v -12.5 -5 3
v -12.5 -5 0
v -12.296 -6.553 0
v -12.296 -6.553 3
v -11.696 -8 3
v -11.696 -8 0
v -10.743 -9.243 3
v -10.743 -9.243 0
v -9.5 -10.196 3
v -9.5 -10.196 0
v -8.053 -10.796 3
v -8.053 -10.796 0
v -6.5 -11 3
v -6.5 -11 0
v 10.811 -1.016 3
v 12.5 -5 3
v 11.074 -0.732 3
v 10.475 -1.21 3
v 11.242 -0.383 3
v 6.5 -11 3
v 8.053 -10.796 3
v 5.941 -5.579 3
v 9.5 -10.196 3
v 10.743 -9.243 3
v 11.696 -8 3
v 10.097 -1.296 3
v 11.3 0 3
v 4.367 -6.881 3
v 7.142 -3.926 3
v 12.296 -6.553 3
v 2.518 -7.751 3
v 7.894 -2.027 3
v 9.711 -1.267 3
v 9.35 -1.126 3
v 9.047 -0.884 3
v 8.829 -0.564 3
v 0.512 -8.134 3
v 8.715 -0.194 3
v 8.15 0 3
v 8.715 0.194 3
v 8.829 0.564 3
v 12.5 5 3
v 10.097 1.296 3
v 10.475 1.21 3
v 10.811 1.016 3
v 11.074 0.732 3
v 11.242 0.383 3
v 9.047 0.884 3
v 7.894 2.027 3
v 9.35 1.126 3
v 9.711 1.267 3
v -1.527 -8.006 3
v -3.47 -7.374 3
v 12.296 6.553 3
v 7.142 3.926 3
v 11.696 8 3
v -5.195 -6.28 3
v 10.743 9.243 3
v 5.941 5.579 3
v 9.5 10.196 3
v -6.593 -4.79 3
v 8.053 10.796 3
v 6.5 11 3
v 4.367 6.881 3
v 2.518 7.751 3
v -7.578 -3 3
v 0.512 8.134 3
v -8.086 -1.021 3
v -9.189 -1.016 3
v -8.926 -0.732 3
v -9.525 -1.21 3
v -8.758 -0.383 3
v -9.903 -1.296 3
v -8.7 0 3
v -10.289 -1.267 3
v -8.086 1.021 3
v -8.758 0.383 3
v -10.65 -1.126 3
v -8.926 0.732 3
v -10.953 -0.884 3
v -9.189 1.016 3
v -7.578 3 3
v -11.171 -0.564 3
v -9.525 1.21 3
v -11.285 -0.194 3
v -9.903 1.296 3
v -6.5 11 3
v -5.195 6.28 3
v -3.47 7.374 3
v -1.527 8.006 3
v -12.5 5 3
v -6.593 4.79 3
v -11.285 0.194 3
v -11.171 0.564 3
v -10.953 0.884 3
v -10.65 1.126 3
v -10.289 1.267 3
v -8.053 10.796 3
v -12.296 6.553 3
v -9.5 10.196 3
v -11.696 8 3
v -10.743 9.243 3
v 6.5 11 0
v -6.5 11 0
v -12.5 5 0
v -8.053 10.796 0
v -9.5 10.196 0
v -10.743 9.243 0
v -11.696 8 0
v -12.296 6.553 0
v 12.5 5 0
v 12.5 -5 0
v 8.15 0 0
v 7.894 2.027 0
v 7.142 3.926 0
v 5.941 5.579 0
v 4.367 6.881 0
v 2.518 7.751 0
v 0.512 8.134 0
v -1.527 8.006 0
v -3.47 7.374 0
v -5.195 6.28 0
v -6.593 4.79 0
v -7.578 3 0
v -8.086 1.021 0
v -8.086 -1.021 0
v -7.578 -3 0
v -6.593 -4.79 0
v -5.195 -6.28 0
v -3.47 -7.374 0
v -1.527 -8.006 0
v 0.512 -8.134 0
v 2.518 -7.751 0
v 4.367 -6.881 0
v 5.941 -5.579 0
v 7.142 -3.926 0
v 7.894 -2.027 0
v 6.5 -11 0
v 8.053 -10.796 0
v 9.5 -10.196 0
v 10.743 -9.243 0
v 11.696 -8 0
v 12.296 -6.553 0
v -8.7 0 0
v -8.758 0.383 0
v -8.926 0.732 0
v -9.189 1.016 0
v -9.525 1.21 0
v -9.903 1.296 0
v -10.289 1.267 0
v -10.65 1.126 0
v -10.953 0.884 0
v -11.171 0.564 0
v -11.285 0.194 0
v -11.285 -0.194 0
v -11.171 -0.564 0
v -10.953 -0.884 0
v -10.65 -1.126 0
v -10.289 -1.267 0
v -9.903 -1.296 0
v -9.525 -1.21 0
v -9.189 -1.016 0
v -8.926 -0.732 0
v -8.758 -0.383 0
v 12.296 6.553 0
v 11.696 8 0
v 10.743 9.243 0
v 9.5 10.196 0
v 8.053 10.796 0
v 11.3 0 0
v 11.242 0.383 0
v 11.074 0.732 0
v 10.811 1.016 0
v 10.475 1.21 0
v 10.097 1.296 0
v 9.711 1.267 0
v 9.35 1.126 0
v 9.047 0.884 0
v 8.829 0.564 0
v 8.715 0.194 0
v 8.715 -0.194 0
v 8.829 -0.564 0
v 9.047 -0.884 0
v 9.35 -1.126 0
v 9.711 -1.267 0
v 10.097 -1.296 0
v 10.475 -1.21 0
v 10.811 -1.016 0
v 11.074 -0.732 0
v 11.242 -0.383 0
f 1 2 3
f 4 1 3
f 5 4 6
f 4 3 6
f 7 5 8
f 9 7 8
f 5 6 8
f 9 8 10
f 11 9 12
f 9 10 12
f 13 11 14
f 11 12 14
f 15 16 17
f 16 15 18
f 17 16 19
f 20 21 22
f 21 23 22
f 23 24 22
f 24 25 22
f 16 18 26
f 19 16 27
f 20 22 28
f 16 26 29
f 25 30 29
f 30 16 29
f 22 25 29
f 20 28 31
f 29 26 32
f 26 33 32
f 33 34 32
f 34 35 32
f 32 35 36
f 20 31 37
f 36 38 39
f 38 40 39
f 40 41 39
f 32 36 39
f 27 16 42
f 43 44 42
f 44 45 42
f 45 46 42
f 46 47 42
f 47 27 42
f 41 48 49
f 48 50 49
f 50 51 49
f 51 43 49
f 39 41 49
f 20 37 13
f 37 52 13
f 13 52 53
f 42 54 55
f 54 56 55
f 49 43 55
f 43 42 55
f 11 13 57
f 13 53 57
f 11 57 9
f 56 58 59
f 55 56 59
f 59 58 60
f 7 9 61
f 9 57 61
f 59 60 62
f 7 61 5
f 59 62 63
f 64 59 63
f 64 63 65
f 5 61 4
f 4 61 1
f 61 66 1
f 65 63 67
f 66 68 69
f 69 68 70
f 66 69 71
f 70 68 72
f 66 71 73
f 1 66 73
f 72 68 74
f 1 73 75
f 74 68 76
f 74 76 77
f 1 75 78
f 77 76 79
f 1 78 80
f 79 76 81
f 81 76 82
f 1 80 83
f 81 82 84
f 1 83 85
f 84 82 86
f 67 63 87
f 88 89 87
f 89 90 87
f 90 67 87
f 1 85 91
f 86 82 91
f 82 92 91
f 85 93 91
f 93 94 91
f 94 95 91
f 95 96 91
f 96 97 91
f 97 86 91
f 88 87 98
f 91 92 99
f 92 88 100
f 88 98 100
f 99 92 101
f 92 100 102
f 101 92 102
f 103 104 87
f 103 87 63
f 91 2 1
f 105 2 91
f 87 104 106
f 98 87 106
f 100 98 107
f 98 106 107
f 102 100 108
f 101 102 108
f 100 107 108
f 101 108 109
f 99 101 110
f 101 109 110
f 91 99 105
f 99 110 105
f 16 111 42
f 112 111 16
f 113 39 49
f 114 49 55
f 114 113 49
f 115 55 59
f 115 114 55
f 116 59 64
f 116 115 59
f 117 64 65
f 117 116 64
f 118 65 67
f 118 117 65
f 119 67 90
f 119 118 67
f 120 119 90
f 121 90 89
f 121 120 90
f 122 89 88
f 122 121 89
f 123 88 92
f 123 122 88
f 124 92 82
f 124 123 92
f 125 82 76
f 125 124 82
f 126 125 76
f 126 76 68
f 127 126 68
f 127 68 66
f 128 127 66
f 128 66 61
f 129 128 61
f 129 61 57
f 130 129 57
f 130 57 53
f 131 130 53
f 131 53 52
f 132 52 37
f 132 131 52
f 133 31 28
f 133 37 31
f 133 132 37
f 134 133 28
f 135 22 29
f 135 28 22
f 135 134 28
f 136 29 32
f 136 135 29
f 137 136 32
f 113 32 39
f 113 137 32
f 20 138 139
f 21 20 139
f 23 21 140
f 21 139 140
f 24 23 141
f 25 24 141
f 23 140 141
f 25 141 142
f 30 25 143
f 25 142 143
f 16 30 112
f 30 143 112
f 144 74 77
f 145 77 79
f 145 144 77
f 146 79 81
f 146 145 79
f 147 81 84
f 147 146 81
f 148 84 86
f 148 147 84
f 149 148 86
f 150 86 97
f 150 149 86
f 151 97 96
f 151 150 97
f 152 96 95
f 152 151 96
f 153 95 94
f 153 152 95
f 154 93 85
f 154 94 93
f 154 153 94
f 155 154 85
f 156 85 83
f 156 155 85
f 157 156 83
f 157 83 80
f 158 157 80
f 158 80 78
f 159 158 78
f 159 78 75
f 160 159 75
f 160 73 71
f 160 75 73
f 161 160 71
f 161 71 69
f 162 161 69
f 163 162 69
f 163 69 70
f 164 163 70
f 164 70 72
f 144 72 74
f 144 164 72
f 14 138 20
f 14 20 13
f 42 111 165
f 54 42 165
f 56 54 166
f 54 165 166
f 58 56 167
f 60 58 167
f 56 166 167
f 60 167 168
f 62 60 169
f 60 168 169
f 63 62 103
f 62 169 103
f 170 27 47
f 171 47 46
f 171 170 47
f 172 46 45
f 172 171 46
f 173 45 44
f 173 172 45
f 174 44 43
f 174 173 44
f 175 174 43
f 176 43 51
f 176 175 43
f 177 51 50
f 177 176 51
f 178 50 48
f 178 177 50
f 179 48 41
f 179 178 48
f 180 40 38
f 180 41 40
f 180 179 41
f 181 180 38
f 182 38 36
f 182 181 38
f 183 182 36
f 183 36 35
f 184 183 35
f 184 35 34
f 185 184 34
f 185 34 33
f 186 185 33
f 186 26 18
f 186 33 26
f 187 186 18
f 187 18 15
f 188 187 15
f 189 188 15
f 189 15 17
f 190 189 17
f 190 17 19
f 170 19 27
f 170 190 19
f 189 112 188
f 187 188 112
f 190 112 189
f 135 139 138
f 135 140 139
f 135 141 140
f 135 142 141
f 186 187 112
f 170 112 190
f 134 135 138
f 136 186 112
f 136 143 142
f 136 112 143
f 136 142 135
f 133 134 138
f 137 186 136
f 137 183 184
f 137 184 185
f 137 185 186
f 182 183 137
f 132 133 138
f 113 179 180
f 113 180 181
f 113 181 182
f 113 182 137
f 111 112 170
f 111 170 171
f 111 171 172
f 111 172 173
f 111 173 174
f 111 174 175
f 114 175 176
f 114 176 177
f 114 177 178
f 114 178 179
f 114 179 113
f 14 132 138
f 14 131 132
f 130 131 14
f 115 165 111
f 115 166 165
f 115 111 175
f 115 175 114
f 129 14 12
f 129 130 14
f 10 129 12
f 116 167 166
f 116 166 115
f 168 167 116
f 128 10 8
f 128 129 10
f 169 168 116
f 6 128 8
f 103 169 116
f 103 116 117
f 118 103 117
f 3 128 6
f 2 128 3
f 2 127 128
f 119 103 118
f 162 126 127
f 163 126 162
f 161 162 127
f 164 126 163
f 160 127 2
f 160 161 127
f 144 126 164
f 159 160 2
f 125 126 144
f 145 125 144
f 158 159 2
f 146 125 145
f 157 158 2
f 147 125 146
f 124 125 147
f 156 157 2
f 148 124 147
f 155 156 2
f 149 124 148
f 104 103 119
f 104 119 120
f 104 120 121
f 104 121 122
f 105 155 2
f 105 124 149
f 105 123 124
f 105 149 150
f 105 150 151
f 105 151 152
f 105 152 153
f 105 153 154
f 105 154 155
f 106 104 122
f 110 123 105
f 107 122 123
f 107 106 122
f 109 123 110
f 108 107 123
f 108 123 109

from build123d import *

# Parameters (mm, degrees)
SKETCH002_R  = 1.3
PAD002_DEPTH = 7
SKETCH001_R  = 8.15
PAD001_DEPTH = 7
PAD_DEPTH    = 3


with BuildPart() as screw_holes:
    # Sketch002 → Pad002 (new body)
    with BuildSketch(Plane.XY):
        with Locations((-10, 0)):
            Circle(SKETCH002_R)
        with Locations((10, 0)):
            Circle(SKETCH002_R)
    extrude(amount=PAD002_DEPTH)


with BuildPart() as lens_hole:
    # Sketch001 → Pad001 (new body)
    with BuildSketch(Plane.XY):
        Circle(SKETCH001_R)
    extrude(amount=PAD001_DEPTH)


with BuildPart() as cut001:
    # Sketch → Pad (new body)
    with BuildSketch(Plane.XY):
        with BuildLine():
            Line((-6.5, 11), (6.5, 11))
            ThreePointArc((12.5, 5), (10.742641, 9.242641), (6.5, 11))
            Line((12.5, 5), (12.5, -5))
            ThreePointArc((6.5, -11), (10.742641, -9.242641), (12.5, -5))
            Line((6.5, -11), (-6.5, -11))
            ThreePointArc((-12.5, -5), (-10.742641, -9.242641), (-6.5, -11))
            Line((-12.5, -5), (-12.5, 5))
            ThreePointArc((-6.5, 11), (-10.742641, 9.242641), (-12.5, 5))
        make_face()
    extrude(amount=PAD_DEPTH)

    # Cut: cut Lens Hole
    add(lens_hole.part, mode=Mode.SUBTRACT)

    # Cut001: cut Screw Holes
    add(screw_holes.part, mode=Mode.SUBTRACT)


solid = cut001.part
